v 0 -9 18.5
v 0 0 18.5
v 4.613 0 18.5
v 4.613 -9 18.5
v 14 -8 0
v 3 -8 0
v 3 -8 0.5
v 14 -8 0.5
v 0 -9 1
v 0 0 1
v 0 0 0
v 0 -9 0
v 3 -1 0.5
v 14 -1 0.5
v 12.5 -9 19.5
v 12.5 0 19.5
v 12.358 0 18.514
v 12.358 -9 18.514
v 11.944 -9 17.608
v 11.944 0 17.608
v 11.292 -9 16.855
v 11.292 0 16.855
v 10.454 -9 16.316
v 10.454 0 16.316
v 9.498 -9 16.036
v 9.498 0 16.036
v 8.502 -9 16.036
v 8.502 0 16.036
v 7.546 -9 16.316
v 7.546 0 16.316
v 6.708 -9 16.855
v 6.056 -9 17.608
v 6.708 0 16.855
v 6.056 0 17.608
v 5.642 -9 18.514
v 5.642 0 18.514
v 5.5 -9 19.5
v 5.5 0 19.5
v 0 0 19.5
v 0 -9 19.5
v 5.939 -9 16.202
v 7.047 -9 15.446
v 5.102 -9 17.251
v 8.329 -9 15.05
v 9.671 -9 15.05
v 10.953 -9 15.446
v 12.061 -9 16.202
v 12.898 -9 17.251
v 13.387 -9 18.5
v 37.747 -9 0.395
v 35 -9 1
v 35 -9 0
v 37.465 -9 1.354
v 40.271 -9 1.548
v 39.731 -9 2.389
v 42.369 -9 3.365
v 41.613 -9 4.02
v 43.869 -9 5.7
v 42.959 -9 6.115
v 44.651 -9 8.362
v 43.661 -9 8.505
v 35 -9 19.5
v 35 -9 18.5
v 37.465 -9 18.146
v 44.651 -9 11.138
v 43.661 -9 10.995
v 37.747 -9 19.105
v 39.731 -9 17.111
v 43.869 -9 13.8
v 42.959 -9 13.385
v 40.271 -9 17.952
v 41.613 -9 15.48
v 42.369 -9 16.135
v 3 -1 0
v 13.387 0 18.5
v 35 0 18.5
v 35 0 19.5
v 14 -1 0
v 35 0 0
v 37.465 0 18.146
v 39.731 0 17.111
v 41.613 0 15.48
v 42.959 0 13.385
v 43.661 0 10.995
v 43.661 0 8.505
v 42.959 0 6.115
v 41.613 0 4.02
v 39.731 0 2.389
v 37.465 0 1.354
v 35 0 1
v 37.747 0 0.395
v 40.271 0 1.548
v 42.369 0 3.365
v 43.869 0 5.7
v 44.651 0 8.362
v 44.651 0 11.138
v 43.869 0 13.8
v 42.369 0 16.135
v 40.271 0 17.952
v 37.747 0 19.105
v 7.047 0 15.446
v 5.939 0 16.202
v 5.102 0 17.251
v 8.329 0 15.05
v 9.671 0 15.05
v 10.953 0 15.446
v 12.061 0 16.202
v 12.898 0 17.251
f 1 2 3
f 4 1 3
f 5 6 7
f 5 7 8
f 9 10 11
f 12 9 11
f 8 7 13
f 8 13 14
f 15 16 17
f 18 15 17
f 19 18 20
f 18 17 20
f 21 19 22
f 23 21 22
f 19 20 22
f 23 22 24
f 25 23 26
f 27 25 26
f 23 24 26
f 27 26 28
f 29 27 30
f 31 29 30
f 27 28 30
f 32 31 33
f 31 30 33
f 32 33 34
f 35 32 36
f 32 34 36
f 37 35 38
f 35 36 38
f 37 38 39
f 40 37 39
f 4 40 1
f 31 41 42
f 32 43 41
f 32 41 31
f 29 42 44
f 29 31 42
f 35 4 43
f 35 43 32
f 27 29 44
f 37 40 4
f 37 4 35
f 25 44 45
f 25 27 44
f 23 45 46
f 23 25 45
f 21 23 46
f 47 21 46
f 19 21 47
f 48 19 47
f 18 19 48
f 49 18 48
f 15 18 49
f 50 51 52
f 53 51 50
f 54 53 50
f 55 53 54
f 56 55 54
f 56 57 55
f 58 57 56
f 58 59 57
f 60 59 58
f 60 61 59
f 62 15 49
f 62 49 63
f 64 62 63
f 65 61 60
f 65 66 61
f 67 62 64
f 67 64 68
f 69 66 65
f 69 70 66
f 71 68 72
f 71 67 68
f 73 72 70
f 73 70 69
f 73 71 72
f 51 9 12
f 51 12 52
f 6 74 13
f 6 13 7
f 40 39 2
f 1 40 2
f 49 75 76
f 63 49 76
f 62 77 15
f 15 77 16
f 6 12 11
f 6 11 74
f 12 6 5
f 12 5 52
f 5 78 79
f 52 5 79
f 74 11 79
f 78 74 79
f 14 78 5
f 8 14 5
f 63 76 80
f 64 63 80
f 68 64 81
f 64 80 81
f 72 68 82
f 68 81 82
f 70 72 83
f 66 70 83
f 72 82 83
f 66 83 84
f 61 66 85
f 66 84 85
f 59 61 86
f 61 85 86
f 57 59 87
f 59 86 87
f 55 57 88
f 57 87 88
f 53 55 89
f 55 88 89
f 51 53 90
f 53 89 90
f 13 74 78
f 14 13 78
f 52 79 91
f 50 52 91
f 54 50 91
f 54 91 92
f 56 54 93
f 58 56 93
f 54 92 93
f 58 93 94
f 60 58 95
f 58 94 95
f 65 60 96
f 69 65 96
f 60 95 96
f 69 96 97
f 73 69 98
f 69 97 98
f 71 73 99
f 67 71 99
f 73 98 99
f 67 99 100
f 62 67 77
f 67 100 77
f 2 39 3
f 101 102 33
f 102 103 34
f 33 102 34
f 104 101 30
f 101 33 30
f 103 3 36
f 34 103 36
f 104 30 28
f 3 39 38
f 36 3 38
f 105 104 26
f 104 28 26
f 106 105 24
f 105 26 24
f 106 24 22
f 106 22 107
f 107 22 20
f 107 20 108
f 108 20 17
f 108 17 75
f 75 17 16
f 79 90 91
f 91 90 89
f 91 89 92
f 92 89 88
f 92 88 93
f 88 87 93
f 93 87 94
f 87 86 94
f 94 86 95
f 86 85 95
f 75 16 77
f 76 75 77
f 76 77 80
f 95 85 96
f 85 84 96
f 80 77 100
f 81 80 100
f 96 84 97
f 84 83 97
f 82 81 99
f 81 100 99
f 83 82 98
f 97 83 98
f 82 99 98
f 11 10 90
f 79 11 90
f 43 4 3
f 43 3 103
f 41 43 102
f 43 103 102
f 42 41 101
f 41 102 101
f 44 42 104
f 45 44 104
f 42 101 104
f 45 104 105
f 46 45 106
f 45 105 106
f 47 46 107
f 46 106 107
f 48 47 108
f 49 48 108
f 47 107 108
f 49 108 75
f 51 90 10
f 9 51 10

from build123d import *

# Parameters (mm, degrees)
F1_DEPTH = 9
F2_W     = 11
F2_H     = 7
F3_DEPTH = 0.5


with BuildPart() as f1:
    # F0 (on Front) → F1 (new body)
    with BuildSketch(Plane.XZ):
        with BuildLine():
            Line((0, 1), (0, 0))
            Line((0, 0), (35, 0))
            ThreePointArc((35, 0), (44.75, 9.75), (35, 19.499999))
            Line((35, 19.499999), (12.5, 19.499999))
            ThreePointArc((12.5, 19.499999), (9, 15.999999), (5.5, 19.499999))
            Line((5.5, 19.499999), (0, 19.499999))
            Line((0, 19.499999), (0, 18.5))
            Line((0, 18.5), (4.612518, 18.5))
            ThreePointArc((4.612518, 18.5), (9, 15), (13.387482, 18.5))
            Line((13.387482, 18.5), (35, 18.5))
            ThreePointArc((35, 18.5), (43.75, 9.75), (35, 1))
            Line((35, 1), (0, 1))
        make_face()
    extrude(amount=F1_DEPTH)

    # F2 (on face) → F3 (cut)
    with BuildSketch(Plane(origin=(0, 0, 0), x_dir=(1, 0, 0), z_dir=(0, 0, -1))):
        with Locations((8.5, 4.5)):
            Rectangle(F2_W, F2_H)
    extrude(amount=-F3_DEPTH, mode=Mode.SUBTRACT)


solid = f1.part
